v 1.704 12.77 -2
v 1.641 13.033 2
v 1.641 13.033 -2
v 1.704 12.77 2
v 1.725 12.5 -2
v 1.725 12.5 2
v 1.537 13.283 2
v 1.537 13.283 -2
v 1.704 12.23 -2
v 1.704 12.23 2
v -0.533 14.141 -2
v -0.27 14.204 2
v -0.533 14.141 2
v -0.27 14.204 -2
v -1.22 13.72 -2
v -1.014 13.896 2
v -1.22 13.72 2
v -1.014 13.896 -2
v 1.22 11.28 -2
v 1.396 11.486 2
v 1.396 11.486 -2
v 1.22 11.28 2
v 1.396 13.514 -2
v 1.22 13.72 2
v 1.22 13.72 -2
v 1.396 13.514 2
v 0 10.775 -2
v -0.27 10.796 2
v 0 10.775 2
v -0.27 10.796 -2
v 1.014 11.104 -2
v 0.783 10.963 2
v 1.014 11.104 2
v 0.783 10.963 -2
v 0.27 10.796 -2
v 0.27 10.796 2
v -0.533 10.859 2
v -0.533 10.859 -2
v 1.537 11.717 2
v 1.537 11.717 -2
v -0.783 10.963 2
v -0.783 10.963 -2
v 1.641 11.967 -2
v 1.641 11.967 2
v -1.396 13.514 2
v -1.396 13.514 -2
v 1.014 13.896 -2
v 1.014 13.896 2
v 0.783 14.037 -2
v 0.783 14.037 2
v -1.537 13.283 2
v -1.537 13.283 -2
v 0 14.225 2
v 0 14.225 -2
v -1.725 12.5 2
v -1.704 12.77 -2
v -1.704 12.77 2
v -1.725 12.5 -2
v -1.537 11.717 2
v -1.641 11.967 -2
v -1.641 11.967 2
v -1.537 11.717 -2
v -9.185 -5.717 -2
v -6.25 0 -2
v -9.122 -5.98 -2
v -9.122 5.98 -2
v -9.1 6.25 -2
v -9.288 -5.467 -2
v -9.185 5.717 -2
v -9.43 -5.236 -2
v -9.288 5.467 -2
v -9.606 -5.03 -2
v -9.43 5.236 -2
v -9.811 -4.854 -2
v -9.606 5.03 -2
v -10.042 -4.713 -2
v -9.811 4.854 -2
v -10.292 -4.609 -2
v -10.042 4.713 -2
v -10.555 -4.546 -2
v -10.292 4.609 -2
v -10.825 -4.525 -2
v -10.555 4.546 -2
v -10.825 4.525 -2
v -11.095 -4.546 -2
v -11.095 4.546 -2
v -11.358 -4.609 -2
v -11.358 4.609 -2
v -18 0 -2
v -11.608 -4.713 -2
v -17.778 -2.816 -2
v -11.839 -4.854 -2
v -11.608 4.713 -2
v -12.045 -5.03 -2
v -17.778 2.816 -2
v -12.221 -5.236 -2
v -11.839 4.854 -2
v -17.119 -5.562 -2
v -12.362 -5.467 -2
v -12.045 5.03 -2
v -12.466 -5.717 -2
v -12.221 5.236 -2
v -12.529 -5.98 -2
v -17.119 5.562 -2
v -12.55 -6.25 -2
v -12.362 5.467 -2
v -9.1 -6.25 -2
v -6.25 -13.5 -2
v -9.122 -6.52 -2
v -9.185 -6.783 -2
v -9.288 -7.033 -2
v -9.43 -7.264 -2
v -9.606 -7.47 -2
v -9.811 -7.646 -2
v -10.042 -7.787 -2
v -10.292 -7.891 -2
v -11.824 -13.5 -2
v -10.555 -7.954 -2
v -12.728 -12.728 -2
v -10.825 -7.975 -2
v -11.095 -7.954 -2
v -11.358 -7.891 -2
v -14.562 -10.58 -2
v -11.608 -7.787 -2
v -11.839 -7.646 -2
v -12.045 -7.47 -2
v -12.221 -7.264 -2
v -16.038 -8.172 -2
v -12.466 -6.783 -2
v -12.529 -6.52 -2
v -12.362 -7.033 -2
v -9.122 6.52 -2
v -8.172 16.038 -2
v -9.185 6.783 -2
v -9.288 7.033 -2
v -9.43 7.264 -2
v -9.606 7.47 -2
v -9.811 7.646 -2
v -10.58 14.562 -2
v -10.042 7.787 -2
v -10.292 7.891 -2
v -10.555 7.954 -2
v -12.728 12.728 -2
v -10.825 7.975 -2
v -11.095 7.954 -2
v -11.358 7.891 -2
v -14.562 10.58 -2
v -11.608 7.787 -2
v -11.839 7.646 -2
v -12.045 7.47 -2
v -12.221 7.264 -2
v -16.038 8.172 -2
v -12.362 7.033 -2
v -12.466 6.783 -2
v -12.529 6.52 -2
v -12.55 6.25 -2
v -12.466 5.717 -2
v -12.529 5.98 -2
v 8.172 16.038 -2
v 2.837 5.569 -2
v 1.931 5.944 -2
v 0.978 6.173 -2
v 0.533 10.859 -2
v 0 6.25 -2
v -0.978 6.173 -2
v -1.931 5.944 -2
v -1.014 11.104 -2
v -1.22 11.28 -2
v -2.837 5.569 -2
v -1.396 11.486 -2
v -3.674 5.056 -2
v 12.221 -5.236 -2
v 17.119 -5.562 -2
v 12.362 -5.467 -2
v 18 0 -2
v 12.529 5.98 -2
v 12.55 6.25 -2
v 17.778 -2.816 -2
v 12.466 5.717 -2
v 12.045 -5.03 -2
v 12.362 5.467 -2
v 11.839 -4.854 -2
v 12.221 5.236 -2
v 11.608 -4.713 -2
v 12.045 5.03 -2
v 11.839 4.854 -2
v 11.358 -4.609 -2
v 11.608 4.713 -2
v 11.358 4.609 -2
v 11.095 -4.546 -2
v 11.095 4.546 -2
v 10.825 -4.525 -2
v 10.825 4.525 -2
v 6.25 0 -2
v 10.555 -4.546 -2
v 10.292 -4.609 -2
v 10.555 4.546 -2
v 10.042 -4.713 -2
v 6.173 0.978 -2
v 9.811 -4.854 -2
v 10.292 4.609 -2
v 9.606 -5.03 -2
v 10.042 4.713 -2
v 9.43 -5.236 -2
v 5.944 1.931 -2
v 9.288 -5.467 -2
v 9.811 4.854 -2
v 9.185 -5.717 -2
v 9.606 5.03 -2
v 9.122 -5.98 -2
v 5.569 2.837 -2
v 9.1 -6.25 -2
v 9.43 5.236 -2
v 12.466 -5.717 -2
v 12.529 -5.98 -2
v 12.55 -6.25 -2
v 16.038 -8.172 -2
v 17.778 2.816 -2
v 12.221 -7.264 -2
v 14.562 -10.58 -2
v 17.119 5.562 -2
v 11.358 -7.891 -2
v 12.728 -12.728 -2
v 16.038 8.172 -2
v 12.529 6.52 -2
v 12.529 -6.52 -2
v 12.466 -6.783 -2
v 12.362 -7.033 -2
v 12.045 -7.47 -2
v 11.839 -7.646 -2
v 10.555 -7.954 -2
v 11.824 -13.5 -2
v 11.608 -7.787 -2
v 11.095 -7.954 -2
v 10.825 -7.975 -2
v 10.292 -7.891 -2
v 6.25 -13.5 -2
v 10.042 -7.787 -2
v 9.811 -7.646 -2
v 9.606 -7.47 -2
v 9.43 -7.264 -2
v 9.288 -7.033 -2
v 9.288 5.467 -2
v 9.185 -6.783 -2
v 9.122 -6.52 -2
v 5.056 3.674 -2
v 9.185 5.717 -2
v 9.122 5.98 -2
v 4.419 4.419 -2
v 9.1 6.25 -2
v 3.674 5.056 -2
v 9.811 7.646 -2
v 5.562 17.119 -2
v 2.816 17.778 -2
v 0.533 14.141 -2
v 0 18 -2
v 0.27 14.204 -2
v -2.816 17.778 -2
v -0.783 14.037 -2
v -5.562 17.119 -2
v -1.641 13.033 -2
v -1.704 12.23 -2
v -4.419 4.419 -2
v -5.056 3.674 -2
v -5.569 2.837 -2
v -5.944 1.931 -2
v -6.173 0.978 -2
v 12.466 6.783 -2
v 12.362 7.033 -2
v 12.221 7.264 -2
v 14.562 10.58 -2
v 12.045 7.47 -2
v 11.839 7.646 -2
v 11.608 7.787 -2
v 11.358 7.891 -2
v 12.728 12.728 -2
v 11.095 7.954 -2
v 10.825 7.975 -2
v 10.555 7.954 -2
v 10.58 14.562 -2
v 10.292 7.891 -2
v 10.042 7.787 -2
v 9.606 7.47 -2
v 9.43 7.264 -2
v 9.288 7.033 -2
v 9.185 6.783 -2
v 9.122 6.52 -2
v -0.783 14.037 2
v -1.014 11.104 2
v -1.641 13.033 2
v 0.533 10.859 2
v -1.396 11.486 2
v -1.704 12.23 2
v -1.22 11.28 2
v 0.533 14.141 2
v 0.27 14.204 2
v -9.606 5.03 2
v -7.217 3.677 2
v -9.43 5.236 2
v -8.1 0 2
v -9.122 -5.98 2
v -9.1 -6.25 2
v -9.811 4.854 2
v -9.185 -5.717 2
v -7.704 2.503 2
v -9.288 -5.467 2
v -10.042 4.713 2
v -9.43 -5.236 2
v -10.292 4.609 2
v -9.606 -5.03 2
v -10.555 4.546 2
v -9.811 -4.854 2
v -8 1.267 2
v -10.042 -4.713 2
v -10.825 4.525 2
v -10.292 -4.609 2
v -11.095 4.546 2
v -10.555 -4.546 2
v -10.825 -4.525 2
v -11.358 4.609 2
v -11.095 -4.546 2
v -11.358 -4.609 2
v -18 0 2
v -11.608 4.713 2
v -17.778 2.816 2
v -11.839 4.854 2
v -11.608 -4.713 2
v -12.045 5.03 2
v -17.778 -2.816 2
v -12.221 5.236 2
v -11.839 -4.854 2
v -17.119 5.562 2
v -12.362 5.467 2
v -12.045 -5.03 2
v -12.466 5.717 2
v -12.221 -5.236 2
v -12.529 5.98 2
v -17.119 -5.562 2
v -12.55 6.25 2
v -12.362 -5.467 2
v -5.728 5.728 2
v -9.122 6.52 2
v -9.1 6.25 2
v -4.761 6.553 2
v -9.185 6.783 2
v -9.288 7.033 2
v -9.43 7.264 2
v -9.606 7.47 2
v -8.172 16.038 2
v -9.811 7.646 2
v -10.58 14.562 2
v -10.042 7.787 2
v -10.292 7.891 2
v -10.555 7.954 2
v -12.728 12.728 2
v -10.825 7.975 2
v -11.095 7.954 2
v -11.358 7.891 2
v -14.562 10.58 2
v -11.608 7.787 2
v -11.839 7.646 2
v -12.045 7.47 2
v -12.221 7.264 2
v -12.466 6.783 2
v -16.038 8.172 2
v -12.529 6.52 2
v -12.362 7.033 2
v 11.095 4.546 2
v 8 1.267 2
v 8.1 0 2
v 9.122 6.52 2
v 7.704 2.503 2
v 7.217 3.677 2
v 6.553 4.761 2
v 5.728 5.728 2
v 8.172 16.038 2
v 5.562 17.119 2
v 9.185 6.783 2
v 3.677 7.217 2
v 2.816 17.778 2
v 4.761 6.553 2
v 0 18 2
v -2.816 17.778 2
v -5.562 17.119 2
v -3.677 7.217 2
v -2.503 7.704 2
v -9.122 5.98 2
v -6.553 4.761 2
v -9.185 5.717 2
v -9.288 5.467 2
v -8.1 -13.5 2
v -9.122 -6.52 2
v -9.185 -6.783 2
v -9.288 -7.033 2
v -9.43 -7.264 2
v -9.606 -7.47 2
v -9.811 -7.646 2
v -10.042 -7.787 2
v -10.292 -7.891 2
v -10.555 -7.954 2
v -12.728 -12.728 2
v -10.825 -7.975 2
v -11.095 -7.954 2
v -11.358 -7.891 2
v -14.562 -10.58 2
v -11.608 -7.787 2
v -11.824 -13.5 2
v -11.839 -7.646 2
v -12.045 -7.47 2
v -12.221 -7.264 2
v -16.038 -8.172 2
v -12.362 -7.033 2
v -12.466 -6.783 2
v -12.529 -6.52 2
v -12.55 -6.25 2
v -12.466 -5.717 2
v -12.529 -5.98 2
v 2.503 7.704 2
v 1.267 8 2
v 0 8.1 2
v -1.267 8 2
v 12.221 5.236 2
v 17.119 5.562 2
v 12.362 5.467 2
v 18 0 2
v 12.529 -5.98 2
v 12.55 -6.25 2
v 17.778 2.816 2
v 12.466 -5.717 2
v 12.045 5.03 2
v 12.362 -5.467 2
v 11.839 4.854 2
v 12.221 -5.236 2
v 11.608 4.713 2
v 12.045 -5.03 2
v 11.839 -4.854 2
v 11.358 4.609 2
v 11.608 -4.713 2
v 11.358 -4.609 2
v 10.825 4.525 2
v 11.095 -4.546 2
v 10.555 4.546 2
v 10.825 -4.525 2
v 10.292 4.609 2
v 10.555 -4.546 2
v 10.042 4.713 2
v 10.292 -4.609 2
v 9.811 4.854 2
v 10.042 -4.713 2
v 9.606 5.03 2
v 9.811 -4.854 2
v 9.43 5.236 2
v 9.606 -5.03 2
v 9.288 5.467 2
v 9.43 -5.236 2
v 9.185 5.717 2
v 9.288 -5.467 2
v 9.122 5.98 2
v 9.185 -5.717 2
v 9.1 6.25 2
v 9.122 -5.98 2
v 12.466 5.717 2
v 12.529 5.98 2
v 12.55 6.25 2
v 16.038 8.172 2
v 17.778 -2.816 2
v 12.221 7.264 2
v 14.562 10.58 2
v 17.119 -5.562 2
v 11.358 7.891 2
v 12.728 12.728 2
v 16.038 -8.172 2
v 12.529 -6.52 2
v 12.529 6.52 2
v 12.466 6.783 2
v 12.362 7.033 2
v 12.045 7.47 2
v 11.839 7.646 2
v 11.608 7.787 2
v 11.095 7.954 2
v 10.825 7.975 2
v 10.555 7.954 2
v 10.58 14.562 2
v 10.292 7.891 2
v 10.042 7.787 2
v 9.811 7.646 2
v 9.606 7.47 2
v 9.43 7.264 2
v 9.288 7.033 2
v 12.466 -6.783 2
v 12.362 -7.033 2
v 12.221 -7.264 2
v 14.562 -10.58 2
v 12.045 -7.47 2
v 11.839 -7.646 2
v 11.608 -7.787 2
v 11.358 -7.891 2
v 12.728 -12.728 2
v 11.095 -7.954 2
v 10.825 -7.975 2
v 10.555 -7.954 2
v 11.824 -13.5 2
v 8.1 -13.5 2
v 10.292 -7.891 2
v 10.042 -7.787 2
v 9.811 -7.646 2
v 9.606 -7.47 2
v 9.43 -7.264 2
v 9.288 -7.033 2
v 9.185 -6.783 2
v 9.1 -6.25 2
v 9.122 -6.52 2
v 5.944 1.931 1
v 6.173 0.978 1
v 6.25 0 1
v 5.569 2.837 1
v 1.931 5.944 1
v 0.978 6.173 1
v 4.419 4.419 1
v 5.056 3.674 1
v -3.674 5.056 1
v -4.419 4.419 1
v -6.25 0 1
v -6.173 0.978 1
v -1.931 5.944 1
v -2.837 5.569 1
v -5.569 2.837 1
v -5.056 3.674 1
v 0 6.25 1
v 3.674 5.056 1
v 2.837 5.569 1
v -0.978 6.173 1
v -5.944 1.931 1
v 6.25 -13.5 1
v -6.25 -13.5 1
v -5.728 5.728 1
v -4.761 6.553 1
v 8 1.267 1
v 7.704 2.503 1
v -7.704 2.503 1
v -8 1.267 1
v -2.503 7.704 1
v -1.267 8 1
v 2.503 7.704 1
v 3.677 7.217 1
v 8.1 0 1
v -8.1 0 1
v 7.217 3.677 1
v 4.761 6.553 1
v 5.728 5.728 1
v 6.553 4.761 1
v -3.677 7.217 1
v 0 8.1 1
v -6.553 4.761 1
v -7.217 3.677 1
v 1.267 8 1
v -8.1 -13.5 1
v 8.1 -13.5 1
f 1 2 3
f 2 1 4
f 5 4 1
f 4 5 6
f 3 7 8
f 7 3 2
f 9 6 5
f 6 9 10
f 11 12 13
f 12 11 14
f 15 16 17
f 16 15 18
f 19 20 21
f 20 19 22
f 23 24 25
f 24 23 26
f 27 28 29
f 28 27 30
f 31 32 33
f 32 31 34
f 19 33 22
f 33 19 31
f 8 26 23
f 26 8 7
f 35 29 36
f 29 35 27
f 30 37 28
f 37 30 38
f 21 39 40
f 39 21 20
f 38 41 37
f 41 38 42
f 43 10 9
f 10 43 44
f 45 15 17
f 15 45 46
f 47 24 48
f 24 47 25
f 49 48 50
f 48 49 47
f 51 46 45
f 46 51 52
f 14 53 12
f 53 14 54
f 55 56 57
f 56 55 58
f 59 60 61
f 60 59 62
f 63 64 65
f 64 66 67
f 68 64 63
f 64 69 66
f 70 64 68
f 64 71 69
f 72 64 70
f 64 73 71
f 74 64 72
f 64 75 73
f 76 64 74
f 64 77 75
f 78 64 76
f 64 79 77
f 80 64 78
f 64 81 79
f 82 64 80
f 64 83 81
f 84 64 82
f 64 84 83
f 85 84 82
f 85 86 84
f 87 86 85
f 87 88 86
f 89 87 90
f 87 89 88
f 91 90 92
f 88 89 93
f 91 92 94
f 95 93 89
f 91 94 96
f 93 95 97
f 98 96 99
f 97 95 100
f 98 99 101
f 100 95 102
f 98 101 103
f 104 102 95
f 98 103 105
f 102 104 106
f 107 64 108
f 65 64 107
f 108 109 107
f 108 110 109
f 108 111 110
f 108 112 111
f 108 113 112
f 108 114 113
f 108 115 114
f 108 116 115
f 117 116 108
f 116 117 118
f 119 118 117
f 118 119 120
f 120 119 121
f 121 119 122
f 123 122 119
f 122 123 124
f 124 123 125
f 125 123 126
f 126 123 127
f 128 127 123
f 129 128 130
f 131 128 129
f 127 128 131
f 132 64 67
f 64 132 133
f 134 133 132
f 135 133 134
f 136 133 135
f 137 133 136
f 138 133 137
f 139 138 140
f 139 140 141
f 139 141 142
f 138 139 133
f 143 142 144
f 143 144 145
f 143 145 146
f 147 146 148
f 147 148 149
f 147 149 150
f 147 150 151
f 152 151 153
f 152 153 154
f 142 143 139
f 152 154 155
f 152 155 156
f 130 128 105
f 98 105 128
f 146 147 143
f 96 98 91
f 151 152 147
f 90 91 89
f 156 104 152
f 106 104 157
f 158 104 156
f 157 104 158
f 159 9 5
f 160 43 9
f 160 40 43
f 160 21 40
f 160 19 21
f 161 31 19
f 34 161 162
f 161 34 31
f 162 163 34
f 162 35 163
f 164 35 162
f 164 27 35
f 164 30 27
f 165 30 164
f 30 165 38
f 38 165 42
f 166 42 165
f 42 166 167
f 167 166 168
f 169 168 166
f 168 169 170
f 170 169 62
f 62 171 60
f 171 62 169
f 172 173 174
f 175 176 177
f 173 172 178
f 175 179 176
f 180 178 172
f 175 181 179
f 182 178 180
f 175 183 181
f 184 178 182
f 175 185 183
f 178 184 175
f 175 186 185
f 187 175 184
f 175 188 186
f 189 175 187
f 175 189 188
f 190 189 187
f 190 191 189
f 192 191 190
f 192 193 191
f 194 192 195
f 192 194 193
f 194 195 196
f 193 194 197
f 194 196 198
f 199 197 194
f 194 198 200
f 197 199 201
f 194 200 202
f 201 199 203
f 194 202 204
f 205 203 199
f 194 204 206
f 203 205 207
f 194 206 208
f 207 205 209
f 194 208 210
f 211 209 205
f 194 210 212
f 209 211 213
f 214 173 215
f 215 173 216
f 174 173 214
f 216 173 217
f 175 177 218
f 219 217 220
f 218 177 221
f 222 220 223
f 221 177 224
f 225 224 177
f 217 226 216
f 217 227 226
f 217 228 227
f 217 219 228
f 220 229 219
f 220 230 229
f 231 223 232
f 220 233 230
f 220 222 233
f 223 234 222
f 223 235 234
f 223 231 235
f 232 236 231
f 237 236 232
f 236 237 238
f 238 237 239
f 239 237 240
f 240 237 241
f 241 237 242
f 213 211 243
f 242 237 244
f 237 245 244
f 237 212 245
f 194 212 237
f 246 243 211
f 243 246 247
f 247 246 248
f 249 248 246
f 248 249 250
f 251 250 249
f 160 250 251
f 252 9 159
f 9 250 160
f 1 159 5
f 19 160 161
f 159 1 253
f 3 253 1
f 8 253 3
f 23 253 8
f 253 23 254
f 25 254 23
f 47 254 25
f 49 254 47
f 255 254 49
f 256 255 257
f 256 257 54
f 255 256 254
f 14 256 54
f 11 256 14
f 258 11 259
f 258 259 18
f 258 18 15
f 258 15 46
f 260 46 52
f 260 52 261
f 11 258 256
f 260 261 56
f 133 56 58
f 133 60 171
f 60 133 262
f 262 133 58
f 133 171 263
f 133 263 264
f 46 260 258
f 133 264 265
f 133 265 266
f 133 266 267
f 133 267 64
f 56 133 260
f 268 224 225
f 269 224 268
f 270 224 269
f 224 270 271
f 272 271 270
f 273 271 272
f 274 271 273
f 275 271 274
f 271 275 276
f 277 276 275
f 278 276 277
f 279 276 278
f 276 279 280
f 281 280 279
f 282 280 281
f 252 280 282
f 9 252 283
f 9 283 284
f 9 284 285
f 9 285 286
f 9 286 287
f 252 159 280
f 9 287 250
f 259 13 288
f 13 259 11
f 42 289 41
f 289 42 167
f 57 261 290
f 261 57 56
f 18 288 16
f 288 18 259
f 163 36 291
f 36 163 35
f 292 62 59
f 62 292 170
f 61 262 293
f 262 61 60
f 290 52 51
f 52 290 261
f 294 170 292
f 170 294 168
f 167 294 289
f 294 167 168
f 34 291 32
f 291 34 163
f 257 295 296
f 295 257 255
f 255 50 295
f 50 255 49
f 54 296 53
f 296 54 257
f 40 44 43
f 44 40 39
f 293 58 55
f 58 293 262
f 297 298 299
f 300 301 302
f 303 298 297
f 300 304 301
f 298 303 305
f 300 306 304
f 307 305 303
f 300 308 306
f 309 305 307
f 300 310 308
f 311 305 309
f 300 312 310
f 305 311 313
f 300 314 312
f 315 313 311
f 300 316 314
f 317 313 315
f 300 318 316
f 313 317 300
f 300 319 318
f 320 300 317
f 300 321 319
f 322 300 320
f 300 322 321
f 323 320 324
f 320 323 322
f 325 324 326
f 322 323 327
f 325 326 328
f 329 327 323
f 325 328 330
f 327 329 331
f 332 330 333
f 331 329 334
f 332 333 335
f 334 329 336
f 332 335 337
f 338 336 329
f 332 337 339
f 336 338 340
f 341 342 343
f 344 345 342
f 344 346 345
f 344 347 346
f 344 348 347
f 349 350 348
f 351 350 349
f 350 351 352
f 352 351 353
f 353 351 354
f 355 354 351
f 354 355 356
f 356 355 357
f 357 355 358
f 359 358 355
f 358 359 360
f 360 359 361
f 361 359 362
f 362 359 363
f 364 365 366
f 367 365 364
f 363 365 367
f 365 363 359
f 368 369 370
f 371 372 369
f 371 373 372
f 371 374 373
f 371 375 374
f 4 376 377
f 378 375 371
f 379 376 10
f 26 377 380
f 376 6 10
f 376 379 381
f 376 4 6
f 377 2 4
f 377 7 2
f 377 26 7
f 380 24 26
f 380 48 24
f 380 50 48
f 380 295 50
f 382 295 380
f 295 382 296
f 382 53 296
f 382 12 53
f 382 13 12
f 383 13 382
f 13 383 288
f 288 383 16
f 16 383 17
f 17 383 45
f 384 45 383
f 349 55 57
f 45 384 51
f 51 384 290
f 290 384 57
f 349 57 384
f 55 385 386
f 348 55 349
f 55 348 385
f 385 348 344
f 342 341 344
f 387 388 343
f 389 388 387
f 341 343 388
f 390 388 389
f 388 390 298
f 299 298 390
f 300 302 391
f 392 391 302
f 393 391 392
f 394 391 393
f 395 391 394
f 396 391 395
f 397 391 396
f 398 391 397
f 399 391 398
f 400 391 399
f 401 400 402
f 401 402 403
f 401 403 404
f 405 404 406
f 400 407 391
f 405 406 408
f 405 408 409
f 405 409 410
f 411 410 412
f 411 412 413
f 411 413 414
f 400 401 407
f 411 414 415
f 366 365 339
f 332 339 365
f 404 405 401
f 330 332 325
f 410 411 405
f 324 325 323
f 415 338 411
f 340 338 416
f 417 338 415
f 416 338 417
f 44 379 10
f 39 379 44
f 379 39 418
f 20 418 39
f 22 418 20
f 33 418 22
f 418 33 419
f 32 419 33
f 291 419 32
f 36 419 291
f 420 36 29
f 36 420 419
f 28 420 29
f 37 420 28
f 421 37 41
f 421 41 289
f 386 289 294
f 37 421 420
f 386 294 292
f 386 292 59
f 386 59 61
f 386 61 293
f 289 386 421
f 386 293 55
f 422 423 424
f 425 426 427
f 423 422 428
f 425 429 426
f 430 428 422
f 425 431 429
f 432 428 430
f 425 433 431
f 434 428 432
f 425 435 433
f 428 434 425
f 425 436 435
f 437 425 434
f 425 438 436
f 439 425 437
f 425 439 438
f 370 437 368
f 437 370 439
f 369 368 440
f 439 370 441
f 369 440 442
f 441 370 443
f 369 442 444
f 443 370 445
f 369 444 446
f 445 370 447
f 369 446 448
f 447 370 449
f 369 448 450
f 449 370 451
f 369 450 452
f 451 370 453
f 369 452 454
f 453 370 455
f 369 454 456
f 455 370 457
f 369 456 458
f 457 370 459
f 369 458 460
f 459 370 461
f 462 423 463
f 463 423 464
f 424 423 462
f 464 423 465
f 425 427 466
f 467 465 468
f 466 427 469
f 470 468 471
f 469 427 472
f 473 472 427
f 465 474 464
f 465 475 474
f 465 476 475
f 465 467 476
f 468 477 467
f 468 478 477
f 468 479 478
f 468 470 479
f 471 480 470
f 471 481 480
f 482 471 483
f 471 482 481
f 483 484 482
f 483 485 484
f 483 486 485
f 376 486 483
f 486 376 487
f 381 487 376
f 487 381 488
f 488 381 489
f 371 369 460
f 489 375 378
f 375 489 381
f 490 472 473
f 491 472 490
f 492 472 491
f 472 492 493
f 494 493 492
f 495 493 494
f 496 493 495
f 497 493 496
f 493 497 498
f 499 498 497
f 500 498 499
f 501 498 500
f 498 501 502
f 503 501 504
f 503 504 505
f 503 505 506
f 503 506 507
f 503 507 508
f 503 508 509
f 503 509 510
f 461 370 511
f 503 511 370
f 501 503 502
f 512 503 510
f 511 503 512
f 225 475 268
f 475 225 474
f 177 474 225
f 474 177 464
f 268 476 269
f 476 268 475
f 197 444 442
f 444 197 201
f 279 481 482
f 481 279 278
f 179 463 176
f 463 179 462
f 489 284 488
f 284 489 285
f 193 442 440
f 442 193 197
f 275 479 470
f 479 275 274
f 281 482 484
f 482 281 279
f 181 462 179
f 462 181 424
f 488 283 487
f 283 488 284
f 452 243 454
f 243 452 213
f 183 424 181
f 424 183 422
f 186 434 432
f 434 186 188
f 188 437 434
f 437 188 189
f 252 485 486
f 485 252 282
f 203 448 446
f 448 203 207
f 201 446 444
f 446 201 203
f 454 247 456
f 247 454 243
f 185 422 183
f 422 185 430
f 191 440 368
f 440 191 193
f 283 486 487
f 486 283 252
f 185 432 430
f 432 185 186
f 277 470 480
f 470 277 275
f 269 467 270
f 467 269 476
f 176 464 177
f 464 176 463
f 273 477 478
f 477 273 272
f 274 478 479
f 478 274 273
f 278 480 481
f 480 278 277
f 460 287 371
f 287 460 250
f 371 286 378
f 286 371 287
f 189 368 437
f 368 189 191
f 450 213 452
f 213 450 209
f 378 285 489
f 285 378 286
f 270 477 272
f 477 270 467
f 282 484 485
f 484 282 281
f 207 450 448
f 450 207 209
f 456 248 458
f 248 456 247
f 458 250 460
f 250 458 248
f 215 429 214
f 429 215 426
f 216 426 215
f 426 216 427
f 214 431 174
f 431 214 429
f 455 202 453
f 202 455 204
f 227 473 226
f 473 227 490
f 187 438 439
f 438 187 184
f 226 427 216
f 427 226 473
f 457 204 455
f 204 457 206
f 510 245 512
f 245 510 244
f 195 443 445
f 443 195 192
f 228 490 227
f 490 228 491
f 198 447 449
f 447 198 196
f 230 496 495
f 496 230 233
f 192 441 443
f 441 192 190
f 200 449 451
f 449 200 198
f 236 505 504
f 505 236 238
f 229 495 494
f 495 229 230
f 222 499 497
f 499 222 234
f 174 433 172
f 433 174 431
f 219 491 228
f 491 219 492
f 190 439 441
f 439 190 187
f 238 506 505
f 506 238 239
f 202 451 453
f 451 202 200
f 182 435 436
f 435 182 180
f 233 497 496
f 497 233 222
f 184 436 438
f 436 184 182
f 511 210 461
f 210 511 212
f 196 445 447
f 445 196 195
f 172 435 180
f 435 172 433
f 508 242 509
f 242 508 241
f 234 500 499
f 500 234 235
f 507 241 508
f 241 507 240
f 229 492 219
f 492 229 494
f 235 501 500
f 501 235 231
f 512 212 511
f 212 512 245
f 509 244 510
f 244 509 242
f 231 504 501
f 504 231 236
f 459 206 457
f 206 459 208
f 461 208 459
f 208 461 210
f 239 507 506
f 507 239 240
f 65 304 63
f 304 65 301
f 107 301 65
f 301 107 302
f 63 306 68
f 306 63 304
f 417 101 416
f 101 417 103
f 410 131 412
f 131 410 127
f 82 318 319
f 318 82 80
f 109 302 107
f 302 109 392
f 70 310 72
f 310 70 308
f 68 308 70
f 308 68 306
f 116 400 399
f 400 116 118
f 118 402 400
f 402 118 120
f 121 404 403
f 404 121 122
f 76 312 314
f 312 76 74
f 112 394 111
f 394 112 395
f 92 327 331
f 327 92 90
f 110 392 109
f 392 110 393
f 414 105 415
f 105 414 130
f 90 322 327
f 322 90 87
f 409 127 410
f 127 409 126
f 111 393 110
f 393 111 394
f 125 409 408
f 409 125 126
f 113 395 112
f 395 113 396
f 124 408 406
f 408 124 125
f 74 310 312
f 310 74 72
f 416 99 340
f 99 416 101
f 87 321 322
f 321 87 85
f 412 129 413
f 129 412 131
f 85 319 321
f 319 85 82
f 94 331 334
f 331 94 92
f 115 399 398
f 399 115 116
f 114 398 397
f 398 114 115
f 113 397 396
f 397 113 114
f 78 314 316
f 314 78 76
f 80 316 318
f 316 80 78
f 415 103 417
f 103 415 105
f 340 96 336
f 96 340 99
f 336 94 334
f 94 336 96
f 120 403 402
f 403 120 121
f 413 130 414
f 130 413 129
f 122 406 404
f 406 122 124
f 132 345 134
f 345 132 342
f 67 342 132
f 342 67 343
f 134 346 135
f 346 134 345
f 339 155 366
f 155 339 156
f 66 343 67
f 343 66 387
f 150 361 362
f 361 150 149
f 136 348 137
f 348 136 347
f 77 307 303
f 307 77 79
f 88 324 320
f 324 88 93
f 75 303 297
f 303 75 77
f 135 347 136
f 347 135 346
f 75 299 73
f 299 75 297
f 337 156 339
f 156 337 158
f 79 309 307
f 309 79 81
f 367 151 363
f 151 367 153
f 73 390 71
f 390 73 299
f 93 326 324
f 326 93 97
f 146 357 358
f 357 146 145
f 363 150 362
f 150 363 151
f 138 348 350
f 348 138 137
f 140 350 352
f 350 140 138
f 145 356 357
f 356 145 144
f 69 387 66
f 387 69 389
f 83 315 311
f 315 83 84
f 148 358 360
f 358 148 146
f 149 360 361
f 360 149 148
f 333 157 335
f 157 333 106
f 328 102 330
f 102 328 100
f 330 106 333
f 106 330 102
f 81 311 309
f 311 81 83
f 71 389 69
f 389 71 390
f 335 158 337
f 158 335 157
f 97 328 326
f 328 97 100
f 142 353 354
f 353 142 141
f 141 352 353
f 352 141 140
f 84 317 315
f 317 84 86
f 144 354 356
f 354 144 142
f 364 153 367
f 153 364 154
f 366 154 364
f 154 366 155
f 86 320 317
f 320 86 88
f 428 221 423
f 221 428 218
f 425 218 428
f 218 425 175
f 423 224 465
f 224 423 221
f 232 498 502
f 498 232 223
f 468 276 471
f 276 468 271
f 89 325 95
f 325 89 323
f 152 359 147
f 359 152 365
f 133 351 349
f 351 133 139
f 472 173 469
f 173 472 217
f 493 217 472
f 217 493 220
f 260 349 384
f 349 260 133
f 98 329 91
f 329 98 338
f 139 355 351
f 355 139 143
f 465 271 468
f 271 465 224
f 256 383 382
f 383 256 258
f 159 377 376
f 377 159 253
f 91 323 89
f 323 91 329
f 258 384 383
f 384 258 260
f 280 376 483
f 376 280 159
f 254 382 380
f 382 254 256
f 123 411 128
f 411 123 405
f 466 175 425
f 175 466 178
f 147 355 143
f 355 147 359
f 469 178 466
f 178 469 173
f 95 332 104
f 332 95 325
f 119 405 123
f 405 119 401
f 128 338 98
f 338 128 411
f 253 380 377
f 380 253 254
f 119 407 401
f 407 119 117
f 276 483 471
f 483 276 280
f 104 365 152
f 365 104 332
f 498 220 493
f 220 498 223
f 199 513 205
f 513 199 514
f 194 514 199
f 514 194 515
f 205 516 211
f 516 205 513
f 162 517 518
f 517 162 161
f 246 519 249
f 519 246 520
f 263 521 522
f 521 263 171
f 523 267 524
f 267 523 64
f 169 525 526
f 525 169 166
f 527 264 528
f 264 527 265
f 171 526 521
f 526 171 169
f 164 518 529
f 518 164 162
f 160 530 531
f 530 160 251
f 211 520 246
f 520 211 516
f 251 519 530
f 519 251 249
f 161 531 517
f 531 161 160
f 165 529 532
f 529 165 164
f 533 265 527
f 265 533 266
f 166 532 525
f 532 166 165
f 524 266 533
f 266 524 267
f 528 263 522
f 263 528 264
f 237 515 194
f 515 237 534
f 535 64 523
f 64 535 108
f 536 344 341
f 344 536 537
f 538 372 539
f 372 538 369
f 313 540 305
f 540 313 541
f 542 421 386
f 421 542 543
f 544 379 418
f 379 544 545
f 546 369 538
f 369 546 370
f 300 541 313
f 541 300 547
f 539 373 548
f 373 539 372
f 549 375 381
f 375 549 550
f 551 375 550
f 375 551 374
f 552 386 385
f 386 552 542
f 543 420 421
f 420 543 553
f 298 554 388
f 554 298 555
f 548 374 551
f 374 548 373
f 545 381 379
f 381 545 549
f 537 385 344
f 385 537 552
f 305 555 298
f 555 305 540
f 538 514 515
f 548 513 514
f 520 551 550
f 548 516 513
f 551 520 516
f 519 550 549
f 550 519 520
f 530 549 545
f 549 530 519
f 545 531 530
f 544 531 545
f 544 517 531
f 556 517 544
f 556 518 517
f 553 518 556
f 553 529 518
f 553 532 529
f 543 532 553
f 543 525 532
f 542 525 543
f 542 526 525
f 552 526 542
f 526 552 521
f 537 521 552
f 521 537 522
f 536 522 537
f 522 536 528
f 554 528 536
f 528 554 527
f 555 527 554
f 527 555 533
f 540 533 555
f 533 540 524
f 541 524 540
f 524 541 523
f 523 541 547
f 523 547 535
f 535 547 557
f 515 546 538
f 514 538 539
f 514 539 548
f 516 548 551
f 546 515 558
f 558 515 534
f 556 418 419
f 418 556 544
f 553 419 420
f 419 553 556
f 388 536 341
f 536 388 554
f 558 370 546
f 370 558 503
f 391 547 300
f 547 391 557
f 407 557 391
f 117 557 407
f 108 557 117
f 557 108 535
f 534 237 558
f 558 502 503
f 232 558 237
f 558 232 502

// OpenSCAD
// file: configuration.scad
// Increase this if your slicer or printer make holes too tight.
extra_radius = 0.1;

// OD = outside diameter, corner to corner.
m3_nut_od = 6.1;
m3_nut_radius = m3_nut_od/2 + 0.2 + extra_radius;
m3_washer_radius = 3.5 + extra_radius;


// OD = outside diameter, corner to corner.
m3_nut_od = 6.1;
m3_nut_radius = m3_nut_od/2 + 0.2 + extra_radius;
m3_washer_radius = 3.5 + extra_radius;


// Major diameter of metric 3mm thread.
m3_major = 2.85;
m3_radius = m3_major/2 + extra_radius;
m3_wide_radius = m3_major/2 + extra_radius + 0.2;

// NEMA17 stepper motors.
motor_shaft_diameter = 5;
motor_shaft_radius = motor_shaft_diameter/2 + extra_radius;

// Frame brackets. M3x8mm screws work best with 3.6 mm brackets.
thickness = 3.6;

// OpenBeam or Misumi. Currently only 15x15 mm, but there is a plan
// to make models more parametric and allow 20x20 mm in the future.
extrusion = 15;

// Placement for the NEMA17 stepper motors.
motor_offset = 44;
motor_length = 47;
// main file
include <configuration.scad>;

// Overall mount dimensions
mount_radius = 18;
//for taobao j-head by bloomlj
mount_thickness = 4;

// Through holes
hole_radius = 12.5;

// Slot and lip for installation
slot_radius = 6.25;
lip_radius = 8.1;
lip_thickness = 1;

$fn = 40;

difference() {
  cylinder(r=mount_radius, h=mount_thickness, center=true);

  // Thru holes
  for (hole_angle = [0:60:360]) {
    translate([sin(hole_angle)*hole_radius,cos(hole_angle)*hole_radius,0]) cylinder(r=m3_wide_radius, h=mount_thickness, center=true);
  }

  // Thru slot
  cylinder(r=slot_radius, h=mount_thickness, center=true);
  translate([0, -mount_radius/2, 0]) cube([2*slot_radius, mount_radius, mount_thickness], center=true);

  // Lip 
  translate([0, 0, (mount_thickness-lip_thickness)/2]) cylinder(r=lip_radius, h=lip_thickness, center=true);
  translate([0, -mount_radius/2, (mount_thickness-lip_thickness)/2]) cube([2*lip_radius, mount_radius, lip_thickness], center=true);

  // Cut off the sharp edges at the front
  translate([0, -7/4*mount_radius, 0]) cube([2*mount_radius, 2*mount_radius, mount_thickness], center=true);
};
